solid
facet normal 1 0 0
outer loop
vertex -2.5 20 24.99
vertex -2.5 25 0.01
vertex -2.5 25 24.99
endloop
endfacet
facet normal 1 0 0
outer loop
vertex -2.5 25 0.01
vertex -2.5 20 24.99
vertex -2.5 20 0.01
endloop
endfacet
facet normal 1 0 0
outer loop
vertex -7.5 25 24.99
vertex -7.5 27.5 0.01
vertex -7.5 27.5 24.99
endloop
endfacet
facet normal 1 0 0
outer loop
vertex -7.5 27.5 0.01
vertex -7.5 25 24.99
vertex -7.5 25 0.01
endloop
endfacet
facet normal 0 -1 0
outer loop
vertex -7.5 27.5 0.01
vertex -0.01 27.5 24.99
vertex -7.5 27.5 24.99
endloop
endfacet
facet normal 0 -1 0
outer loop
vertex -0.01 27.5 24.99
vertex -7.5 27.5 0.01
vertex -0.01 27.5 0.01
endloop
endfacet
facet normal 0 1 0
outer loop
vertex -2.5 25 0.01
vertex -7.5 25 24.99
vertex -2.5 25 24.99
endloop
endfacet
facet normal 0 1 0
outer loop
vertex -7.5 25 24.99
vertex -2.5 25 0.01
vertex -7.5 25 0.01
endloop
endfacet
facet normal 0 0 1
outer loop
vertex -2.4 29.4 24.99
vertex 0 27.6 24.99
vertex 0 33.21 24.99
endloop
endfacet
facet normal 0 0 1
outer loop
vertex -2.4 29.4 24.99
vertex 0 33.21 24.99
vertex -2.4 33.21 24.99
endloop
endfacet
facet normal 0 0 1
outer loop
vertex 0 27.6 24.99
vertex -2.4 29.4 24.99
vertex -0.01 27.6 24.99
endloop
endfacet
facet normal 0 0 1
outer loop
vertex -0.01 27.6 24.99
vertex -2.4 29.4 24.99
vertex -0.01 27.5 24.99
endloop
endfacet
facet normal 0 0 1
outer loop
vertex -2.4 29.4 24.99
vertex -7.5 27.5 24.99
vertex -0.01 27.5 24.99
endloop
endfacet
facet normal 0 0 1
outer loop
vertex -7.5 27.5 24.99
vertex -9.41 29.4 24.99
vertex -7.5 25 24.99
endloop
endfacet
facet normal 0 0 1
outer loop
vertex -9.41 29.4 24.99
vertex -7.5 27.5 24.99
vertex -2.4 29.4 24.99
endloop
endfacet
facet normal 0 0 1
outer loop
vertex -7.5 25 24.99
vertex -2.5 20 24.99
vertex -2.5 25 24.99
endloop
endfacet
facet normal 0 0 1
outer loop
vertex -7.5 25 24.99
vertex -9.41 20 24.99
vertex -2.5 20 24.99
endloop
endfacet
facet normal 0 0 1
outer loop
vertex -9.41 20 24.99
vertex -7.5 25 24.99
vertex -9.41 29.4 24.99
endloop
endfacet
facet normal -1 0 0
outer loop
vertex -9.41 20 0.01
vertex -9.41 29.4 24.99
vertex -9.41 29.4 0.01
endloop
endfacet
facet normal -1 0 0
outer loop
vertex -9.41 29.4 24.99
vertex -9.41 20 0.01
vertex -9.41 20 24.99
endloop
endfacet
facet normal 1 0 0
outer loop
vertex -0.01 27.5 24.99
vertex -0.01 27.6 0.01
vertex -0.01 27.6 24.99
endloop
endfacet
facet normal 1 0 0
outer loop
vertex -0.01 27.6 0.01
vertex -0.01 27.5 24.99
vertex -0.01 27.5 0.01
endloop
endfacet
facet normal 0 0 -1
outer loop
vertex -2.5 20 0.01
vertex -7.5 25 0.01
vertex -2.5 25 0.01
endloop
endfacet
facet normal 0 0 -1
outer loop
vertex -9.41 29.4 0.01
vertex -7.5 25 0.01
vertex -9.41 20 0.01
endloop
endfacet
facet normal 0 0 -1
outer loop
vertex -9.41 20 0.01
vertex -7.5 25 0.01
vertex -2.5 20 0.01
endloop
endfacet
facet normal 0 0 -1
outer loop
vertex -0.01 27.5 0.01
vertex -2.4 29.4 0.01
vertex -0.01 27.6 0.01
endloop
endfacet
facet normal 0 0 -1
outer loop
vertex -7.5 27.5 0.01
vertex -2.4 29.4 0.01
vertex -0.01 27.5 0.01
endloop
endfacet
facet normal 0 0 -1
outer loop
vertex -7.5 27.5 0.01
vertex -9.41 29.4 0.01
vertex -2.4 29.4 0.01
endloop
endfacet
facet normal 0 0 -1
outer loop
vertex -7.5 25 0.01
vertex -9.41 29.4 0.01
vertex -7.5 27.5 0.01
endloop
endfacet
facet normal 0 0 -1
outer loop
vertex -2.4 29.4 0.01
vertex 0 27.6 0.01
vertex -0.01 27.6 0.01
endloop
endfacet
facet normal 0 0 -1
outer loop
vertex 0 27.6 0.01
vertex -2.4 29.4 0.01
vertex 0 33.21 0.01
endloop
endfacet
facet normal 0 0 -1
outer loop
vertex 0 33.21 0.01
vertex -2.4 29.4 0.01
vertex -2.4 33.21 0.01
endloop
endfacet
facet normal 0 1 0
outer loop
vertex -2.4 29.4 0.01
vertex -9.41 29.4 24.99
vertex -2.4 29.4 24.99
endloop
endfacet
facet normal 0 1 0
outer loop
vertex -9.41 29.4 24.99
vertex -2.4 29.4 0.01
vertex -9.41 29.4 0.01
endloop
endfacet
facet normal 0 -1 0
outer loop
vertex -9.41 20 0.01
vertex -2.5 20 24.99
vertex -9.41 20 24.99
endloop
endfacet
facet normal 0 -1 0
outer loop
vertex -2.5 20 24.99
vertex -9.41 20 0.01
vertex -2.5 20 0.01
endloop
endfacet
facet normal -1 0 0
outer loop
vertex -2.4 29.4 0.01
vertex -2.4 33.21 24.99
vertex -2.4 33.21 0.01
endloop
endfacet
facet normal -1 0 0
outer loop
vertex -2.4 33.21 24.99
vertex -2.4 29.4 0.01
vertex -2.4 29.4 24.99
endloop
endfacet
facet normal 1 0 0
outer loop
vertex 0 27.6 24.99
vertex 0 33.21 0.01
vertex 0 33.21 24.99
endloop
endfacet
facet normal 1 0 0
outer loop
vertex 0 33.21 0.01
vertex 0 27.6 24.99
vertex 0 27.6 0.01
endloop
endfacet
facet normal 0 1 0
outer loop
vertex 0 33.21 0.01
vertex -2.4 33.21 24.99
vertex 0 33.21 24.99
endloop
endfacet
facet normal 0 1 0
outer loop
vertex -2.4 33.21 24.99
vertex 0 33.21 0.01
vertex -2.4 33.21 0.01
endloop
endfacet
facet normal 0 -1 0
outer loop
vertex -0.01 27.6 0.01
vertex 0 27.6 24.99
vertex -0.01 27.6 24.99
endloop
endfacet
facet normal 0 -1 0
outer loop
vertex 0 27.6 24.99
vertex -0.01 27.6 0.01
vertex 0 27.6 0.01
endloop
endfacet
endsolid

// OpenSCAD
// Measurements are based on jig recommendations

angle = 35;
size = 25;

h = 25;

wall=2.5; // because it seems to work

text_depth = .4  * 2; // set to a ratio of your extruder width

// A global overlap variable (to prevent printing glitches)
$o = .06;

// Render the part
chisel_sharpening_jig_key();

/* ******************************************************************************
 * Main module code below:
 * ****************************************************************************** */

module chisel_sharpening_jig_key() {
    rotate([0,-90,0])
    union(){
        difference(){
            translate([0.01,20,0.01]) cube([24.98,9.4,9.4]);
            union() {
                cube([h, size + .1, wall]);
                translate([0,size, 0])
                    cube([h, wall, 5+wall]);
                translate([0,0,-15+$o])
                    cube([h, wall, 15+$o]);
                *translate([0,0, 0])
                    cube([wall, size, 10]);
            }
        }
        translate([0.01,27.6,0]) cube([24.98,5.61,2.4]);
    }
}
